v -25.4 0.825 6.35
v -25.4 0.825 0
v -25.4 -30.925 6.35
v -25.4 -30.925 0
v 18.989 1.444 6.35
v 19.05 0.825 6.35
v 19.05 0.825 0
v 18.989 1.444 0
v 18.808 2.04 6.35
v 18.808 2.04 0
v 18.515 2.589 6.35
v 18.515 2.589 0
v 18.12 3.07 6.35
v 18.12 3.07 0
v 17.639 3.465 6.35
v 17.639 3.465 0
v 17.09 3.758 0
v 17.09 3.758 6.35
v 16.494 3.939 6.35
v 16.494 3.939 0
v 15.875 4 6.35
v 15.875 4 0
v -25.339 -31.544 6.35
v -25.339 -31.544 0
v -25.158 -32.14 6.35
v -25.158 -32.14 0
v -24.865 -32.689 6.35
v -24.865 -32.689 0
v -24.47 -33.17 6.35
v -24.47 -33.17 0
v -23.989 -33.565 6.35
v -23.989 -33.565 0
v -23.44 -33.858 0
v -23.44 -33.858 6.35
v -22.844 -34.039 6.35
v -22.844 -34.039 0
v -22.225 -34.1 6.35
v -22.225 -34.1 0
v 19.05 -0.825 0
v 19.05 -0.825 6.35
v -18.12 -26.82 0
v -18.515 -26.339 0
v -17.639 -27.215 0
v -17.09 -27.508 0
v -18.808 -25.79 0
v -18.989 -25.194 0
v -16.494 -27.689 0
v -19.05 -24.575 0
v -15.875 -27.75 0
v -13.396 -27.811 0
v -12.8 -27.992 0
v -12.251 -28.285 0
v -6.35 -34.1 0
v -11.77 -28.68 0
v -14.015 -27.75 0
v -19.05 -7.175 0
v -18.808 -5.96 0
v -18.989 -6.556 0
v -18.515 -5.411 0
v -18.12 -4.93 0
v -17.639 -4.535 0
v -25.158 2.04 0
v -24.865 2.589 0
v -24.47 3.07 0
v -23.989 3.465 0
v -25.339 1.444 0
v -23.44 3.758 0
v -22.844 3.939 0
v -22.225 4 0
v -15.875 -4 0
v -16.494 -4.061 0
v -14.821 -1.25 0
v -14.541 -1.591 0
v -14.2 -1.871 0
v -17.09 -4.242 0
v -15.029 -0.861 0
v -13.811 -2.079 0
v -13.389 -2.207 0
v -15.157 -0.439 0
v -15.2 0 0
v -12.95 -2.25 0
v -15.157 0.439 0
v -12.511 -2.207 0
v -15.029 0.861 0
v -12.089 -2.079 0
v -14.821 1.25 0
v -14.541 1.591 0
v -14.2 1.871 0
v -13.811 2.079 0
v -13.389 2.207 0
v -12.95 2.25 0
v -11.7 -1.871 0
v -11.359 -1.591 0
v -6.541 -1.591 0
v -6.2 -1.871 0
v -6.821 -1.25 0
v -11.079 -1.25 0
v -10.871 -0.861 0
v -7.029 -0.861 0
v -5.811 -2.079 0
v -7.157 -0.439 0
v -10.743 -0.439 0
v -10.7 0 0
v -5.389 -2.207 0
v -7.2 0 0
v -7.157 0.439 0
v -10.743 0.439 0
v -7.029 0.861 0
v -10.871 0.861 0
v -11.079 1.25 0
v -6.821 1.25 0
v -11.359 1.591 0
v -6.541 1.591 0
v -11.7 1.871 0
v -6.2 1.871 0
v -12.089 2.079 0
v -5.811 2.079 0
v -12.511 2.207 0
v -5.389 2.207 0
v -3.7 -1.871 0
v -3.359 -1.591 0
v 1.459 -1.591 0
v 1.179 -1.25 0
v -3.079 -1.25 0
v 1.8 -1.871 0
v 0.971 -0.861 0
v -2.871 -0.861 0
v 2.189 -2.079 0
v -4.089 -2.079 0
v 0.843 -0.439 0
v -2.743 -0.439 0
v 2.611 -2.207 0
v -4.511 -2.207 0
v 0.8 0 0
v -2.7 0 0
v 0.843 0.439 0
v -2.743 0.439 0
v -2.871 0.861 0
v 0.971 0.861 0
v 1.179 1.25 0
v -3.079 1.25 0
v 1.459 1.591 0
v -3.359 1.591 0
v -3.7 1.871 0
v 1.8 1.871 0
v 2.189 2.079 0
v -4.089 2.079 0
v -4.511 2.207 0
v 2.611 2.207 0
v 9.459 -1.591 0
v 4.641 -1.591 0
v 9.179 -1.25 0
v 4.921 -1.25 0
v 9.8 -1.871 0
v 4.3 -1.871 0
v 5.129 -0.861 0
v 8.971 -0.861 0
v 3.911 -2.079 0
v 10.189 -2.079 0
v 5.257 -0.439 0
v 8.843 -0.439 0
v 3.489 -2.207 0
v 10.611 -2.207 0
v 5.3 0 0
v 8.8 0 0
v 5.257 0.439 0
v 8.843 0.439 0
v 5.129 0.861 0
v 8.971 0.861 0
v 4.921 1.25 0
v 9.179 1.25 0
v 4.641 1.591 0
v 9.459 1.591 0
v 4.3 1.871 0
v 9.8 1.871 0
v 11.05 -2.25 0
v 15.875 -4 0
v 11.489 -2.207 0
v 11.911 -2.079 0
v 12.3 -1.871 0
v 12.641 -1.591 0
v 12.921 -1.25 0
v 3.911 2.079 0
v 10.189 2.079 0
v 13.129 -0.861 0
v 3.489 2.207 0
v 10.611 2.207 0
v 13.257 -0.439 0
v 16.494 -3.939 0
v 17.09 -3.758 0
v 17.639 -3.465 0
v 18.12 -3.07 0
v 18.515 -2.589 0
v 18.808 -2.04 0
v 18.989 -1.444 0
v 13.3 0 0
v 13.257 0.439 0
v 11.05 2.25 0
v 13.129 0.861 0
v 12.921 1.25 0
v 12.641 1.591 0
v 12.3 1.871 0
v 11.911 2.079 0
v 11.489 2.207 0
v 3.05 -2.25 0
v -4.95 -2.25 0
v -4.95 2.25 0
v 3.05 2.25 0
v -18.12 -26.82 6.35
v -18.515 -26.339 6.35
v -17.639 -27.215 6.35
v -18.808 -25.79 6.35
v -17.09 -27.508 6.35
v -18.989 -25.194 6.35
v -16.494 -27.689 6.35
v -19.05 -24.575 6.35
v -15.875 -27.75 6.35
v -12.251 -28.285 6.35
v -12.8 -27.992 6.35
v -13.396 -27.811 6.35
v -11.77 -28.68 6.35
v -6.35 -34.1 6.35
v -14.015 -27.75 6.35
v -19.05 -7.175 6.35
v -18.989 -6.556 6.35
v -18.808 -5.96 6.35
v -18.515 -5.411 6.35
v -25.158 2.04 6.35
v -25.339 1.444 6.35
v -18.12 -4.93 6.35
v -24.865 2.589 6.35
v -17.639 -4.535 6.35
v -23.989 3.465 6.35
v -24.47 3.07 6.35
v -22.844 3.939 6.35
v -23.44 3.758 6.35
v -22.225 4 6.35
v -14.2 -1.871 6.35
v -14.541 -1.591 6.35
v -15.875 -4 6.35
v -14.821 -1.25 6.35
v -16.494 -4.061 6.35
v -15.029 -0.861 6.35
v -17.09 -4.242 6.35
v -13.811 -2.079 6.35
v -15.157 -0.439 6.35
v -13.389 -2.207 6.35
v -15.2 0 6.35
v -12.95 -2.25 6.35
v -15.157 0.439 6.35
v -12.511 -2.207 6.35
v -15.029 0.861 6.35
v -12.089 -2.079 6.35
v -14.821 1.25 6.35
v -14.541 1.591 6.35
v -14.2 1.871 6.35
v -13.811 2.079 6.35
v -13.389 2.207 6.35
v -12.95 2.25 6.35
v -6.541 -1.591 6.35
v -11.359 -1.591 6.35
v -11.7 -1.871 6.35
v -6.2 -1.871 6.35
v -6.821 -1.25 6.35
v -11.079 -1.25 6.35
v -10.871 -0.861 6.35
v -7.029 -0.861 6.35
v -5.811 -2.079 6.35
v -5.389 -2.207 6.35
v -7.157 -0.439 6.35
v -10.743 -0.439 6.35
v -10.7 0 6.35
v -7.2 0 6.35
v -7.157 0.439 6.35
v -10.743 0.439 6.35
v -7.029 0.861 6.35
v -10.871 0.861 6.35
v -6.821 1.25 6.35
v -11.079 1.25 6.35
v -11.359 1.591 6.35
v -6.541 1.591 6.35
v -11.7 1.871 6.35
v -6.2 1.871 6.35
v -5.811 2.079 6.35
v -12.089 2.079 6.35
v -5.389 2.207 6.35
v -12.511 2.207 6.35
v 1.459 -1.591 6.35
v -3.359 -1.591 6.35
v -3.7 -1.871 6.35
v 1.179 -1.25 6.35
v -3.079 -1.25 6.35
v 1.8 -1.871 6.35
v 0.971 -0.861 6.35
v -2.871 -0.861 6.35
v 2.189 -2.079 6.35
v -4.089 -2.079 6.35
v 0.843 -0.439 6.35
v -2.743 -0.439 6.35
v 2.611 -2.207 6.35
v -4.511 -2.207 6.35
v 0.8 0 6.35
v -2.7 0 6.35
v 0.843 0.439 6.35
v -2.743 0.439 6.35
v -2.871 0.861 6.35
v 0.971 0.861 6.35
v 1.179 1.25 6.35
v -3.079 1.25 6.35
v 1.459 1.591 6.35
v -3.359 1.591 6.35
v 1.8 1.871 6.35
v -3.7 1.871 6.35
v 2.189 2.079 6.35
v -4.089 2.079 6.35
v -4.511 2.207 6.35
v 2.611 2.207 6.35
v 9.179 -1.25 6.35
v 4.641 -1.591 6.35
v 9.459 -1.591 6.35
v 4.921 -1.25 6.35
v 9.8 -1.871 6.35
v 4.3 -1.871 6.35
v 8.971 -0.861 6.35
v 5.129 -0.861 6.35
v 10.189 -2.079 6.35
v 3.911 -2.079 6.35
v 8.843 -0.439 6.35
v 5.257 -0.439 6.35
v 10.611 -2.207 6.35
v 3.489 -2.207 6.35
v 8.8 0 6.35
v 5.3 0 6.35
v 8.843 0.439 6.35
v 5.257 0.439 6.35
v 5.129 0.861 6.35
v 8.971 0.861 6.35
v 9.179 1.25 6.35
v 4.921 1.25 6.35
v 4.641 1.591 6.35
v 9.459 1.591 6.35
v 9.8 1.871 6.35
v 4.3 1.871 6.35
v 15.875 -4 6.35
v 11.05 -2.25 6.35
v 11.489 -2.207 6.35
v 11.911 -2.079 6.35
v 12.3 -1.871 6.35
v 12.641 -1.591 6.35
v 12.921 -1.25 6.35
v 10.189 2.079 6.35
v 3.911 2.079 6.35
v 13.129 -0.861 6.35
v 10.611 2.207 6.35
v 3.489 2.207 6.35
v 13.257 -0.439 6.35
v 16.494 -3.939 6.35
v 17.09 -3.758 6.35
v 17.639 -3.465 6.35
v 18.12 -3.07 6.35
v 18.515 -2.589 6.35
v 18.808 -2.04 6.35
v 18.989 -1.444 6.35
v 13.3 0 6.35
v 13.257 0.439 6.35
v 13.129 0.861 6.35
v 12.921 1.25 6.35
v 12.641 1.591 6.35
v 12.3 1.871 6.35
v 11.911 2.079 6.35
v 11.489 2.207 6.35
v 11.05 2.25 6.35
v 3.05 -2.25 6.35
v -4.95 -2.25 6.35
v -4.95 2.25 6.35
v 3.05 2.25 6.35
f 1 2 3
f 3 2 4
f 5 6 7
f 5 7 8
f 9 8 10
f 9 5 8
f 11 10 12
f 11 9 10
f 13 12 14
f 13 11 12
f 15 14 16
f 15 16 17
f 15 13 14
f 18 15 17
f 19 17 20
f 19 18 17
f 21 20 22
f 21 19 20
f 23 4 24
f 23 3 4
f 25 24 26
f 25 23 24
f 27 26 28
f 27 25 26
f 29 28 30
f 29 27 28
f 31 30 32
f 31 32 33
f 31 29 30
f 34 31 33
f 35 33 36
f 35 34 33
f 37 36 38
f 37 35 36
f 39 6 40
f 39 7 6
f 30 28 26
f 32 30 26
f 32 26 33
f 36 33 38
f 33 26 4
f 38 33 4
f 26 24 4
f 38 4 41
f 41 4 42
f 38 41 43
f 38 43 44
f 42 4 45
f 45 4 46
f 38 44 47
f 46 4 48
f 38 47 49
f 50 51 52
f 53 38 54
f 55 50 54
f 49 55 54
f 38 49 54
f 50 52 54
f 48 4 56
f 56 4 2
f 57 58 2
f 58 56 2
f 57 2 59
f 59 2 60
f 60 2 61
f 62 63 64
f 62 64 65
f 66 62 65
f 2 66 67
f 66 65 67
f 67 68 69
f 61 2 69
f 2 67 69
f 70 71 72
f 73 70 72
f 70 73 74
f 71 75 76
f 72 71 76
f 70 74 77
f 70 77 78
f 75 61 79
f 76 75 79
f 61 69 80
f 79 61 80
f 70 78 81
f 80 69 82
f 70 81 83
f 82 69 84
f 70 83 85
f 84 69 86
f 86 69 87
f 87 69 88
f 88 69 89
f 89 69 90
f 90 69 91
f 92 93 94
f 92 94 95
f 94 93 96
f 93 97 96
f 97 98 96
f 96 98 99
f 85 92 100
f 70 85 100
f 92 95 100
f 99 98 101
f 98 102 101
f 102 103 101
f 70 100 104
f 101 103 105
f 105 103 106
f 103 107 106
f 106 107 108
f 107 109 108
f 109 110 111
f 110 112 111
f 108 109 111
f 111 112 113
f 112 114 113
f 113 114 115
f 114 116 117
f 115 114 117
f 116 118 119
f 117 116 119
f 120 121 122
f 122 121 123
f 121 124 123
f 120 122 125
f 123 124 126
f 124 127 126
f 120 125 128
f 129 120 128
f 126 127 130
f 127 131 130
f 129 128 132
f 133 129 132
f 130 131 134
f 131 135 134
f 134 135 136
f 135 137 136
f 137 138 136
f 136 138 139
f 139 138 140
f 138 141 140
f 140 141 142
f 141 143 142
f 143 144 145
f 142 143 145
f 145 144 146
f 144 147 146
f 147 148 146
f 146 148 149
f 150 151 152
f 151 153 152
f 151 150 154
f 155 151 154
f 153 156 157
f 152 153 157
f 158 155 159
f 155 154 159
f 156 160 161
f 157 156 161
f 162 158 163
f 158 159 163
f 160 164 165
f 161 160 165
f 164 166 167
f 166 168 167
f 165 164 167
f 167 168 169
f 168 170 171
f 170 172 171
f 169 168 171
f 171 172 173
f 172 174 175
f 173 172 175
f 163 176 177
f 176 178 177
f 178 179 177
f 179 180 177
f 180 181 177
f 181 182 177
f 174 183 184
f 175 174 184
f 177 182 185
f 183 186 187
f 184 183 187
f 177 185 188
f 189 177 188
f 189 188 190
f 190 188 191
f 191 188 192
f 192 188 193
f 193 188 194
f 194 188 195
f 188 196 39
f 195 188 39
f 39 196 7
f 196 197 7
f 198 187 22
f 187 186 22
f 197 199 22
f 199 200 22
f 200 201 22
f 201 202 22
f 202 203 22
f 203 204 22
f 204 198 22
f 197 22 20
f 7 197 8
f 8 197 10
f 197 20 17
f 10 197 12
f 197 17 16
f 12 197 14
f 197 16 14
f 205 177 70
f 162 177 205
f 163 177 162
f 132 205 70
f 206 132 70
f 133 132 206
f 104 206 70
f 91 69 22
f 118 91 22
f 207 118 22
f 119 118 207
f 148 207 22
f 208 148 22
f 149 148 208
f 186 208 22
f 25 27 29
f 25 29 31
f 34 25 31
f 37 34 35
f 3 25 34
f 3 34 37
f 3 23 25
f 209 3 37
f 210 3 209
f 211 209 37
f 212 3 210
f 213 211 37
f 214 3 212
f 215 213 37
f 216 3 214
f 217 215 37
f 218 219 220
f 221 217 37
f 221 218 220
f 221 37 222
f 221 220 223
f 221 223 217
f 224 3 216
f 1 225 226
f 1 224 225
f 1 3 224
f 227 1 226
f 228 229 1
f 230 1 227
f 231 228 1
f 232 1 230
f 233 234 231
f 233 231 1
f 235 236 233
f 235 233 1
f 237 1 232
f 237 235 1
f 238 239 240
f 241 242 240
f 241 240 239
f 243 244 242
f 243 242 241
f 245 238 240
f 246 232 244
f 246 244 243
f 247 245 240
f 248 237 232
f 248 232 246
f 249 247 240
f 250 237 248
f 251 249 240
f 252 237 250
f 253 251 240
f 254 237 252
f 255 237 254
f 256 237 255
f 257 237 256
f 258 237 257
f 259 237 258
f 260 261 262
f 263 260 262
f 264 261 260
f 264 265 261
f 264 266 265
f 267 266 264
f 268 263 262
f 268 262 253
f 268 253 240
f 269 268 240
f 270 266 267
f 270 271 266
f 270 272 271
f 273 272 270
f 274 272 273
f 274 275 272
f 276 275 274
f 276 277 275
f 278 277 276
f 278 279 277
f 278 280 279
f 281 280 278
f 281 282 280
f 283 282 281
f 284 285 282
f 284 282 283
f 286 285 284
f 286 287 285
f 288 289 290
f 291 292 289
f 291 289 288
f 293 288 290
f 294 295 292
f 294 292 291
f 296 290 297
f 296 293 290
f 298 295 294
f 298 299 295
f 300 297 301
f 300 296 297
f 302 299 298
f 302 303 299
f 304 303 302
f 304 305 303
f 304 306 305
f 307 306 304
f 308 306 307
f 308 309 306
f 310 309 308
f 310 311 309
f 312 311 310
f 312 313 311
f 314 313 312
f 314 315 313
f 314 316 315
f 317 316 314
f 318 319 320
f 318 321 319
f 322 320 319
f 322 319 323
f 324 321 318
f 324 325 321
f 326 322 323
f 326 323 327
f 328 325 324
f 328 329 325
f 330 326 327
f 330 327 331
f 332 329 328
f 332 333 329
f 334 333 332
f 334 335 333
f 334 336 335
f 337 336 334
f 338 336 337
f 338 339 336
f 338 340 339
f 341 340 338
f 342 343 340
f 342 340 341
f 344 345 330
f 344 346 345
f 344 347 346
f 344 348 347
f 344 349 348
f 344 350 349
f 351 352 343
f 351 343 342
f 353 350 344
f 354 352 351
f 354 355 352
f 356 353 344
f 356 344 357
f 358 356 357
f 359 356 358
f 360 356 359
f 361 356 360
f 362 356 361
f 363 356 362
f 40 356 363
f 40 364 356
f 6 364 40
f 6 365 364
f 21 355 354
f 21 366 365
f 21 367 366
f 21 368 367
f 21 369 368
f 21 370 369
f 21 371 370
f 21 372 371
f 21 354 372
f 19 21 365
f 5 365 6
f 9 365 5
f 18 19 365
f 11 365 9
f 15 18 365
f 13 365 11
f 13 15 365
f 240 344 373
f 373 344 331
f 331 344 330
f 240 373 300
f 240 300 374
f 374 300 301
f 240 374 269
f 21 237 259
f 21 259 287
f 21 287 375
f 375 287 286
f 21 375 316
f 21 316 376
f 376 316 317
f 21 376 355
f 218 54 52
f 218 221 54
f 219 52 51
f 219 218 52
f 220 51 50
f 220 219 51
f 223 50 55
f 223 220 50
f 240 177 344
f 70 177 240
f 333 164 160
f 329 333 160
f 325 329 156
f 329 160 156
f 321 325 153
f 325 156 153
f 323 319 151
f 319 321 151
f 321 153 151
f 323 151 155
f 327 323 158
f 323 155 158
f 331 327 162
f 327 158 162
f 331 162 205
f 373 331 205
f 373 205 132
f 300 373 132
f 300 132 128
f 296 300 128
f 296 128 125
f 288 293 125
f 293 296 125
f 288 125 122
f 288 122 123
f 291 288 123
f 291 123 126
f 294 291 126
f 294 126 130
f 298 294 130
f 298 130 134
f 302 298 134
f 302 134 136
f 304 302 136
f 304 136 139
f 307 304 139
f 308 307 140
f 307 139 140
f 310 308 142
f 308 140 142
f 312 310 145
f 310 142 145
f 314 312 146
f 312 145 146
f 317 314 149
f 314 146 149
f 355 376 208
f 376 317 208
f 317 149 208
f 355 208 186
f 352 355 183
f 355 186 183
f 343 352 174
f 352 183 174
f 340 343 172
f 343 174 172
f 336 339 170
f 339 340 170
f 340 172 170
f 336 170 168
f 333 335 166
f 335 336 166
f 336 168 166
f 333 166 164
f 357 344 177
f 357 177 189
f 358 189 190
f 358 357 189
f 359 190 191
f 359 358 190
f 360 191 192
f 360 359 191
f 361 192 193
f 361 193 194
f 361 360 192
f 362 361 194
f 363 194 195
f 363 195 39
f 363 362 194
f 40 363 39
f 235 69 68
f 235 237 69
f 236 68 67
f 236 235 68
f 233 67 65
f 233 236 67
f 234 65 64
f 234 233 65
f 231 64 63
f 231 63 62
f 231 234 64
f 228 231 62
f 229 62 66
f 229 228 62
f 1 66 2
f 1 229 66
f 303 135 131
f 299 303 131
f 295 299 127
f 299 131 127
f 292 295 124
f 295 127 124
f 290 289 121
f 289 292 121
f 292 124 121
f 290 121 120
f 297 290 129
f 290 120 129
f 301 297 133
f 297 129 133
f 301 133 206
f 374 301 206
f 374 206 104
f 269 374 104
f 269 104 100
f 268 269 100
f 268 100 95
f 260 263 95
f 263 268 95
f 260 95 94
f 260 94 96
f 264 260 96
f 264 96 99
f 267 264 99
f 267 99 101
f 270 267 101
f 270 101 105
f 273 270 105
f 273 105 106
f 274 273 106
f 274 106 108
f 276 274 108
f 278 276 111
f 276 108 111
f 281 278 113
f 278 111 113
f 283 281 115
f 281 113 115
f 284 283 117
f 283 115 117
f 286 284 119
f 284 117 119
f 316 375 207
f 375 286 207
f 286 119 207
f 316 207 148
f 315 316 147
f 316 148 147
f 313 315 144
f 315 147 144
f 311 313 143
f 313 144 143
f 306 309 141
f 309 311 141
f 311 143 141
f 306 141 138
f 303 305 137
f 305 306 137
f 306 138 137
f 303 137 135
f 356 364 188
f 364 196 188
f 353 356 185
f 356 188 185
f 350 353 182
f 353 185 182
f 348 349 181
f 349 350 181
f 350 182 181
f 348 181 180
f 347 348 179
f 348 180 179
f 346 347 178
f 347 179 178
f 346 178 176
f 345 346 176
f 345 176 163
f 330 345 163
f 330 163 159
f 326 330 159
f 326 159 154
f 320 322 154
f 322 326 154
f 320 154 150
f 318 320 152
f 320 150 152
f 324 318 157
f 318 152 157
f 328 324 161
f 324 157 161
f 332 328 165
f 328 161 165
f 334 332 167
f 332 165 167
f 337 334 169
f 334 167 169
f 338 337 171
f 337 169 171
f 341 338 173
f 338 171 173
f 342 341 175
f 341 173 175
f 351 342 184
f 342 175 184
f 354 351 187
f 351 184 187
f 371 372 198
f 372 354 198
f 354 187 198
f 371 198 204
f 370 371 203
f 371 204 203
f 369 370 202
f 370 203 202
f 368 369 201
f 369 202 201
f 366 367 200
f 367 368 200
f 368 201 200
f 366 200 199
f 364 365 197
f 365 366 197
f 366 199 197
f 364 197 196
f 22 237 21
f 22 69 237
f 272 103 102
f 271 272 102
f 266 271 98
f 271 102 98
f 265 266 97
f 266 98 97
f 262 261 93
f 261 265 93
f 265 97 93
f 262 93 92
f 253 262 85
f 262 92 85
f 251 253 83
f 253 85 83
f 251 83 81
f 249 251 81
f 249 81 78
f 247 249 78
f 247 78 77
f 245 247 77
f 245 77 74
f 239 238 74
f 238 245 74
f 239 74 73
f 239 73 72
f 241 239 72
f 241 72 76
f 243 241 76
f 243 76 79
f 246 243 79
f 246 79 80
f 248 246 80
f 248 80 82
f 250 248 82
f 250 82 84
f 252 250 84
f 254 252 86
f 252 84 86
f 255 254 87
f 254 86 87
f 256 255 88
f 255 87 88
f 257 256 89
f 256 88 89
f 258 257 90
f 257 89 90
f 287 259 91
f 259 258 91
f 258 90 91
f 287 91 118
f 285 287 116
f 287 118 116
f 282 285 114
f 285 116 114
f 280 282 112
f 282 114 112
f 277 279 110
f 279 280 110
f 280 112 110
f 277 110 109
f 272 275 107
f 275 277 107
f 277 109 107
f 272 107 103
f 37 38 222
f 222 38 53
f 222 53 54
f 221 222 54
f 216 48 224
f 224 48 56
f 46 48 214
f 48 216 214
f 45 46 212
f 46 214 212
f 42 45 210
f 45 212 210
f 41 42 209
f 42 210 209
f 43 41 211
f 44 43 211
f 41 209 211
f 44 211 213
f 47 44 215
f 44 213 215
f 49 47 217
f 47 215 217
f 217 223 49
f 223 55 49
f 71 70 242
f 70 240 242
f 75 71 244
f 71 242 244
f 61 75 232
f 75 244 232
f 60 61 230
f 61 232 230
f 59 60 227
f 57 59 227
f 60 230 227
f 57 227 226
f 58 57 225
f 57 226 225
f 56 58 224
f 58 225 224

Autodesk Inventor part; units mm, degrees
ref_plane "YZ Plane" through (0, 0, 0) normal (1, 0, 0) x (0, 1, 0)
ref_plane "XZ Plane" through (0, 0, 0) normal (0, 1, 0) x (-1, 0, 0)
ref_plane "XY Plane" through (0, 0, 0) normal (0, 0, 1) x (1, 0, 0)
sketch "Sketch1" plane through (0, 0, 0) normal (0, 0, 1) x (1, 0, 0)
  line L0 (19.05, -4) -> (-19.05, -4)
  line L1 (-19.05, -4) -> (-19.05, 4)
  line L2 (-19.05, 4) -> (19.05, 4)
  line L3 (19.05, 4) -> (19.05, -4)
  line L4 (19.05, -4) -> (-19.05, 4) construction
  line L5 (-19.05, -4) -> (19.05, 4) construction
  circle A0 centre (11.05, 0) radius 2.25
  circle A1 centre (3.05, 0) radius 2.25
  circle A2 centre (-4.95, 0) radius 2.25
  circle A3 centre (-12.95, 0) radius 2.25
  line L6 (-19.05, 4) -> (-25.4, 4)
  line L7 (-25.4, 4) -> (-25.4, -34.1)
  line L8 (-25.4, -34.1) -> (-19.05, -34.1)
  line L9 (-19.05, -34.1) -> (-19.05, 4)
  line L10 (-25.4, -34.1) -> (-12.6924, -34.1) construction
  line L11 (-25.4, -34.1) -> (-6.35, -34.1)
  line L12 (-6.35, -34.1) -> (-6.35, -27.75)
  line L13 (-6.35, -27.75) -> (-25.4, -27.75)
  line L14 (-25.4, -27.75) -> (-25.4, -34.1)
  line L15 (-6.35, -34.1) -> (-17.257, -23.193)
  point P0 (0, 0)
  point P1 (-19.05, -27.75)
  point P2 (-12.7, -27.75)
  point P3 (-19.05, -27.75)
  dimension "d0" = 38.1
  dimension "d1" = 8
  dimension "d2" = 4.5
  dimension "d3" = 8
  dimension "d4" = 4.5
  dimension "d5" = 8
  dimension "d6" = 4.5
  dimension "d7" = 8
  dimension "d8" = 4.5
  dimension "d9" = 8
  dimension "d10" = 4
  dimension "d11" = 4
  dimension "d12" = 4
  dimension "d13" = 4
  dimension "d16" = 6.35
  dimension "d17" = 38.1
  dimension "d20" = 19.05
  dimension "d21" = 6.35
  dimension "d22" = 45
extrude "Extrusion1" add sketch "Sketch1" along normal blind 6.35 contours L0 L1 L2 L3 | L9 L13 L7 L6 L1 | L13 L15 L11 L9 | L9 L8 L7 L13
fillet "Fillet1" radius 3.175 5 edges at (-19.05, -27.75, 3.175) (-19.05, -4, 3.175) (-25.4, 4, 3.175) (19.05, 4, 3.175) (19.05, -4, 3.175)
fillet "Fillet2" radius 3.175 2 edges at (-12.7, -27.75, 3.175) (-25.4, -34.1, 3.175)
properties part number "CS_Latch_Hooks"
